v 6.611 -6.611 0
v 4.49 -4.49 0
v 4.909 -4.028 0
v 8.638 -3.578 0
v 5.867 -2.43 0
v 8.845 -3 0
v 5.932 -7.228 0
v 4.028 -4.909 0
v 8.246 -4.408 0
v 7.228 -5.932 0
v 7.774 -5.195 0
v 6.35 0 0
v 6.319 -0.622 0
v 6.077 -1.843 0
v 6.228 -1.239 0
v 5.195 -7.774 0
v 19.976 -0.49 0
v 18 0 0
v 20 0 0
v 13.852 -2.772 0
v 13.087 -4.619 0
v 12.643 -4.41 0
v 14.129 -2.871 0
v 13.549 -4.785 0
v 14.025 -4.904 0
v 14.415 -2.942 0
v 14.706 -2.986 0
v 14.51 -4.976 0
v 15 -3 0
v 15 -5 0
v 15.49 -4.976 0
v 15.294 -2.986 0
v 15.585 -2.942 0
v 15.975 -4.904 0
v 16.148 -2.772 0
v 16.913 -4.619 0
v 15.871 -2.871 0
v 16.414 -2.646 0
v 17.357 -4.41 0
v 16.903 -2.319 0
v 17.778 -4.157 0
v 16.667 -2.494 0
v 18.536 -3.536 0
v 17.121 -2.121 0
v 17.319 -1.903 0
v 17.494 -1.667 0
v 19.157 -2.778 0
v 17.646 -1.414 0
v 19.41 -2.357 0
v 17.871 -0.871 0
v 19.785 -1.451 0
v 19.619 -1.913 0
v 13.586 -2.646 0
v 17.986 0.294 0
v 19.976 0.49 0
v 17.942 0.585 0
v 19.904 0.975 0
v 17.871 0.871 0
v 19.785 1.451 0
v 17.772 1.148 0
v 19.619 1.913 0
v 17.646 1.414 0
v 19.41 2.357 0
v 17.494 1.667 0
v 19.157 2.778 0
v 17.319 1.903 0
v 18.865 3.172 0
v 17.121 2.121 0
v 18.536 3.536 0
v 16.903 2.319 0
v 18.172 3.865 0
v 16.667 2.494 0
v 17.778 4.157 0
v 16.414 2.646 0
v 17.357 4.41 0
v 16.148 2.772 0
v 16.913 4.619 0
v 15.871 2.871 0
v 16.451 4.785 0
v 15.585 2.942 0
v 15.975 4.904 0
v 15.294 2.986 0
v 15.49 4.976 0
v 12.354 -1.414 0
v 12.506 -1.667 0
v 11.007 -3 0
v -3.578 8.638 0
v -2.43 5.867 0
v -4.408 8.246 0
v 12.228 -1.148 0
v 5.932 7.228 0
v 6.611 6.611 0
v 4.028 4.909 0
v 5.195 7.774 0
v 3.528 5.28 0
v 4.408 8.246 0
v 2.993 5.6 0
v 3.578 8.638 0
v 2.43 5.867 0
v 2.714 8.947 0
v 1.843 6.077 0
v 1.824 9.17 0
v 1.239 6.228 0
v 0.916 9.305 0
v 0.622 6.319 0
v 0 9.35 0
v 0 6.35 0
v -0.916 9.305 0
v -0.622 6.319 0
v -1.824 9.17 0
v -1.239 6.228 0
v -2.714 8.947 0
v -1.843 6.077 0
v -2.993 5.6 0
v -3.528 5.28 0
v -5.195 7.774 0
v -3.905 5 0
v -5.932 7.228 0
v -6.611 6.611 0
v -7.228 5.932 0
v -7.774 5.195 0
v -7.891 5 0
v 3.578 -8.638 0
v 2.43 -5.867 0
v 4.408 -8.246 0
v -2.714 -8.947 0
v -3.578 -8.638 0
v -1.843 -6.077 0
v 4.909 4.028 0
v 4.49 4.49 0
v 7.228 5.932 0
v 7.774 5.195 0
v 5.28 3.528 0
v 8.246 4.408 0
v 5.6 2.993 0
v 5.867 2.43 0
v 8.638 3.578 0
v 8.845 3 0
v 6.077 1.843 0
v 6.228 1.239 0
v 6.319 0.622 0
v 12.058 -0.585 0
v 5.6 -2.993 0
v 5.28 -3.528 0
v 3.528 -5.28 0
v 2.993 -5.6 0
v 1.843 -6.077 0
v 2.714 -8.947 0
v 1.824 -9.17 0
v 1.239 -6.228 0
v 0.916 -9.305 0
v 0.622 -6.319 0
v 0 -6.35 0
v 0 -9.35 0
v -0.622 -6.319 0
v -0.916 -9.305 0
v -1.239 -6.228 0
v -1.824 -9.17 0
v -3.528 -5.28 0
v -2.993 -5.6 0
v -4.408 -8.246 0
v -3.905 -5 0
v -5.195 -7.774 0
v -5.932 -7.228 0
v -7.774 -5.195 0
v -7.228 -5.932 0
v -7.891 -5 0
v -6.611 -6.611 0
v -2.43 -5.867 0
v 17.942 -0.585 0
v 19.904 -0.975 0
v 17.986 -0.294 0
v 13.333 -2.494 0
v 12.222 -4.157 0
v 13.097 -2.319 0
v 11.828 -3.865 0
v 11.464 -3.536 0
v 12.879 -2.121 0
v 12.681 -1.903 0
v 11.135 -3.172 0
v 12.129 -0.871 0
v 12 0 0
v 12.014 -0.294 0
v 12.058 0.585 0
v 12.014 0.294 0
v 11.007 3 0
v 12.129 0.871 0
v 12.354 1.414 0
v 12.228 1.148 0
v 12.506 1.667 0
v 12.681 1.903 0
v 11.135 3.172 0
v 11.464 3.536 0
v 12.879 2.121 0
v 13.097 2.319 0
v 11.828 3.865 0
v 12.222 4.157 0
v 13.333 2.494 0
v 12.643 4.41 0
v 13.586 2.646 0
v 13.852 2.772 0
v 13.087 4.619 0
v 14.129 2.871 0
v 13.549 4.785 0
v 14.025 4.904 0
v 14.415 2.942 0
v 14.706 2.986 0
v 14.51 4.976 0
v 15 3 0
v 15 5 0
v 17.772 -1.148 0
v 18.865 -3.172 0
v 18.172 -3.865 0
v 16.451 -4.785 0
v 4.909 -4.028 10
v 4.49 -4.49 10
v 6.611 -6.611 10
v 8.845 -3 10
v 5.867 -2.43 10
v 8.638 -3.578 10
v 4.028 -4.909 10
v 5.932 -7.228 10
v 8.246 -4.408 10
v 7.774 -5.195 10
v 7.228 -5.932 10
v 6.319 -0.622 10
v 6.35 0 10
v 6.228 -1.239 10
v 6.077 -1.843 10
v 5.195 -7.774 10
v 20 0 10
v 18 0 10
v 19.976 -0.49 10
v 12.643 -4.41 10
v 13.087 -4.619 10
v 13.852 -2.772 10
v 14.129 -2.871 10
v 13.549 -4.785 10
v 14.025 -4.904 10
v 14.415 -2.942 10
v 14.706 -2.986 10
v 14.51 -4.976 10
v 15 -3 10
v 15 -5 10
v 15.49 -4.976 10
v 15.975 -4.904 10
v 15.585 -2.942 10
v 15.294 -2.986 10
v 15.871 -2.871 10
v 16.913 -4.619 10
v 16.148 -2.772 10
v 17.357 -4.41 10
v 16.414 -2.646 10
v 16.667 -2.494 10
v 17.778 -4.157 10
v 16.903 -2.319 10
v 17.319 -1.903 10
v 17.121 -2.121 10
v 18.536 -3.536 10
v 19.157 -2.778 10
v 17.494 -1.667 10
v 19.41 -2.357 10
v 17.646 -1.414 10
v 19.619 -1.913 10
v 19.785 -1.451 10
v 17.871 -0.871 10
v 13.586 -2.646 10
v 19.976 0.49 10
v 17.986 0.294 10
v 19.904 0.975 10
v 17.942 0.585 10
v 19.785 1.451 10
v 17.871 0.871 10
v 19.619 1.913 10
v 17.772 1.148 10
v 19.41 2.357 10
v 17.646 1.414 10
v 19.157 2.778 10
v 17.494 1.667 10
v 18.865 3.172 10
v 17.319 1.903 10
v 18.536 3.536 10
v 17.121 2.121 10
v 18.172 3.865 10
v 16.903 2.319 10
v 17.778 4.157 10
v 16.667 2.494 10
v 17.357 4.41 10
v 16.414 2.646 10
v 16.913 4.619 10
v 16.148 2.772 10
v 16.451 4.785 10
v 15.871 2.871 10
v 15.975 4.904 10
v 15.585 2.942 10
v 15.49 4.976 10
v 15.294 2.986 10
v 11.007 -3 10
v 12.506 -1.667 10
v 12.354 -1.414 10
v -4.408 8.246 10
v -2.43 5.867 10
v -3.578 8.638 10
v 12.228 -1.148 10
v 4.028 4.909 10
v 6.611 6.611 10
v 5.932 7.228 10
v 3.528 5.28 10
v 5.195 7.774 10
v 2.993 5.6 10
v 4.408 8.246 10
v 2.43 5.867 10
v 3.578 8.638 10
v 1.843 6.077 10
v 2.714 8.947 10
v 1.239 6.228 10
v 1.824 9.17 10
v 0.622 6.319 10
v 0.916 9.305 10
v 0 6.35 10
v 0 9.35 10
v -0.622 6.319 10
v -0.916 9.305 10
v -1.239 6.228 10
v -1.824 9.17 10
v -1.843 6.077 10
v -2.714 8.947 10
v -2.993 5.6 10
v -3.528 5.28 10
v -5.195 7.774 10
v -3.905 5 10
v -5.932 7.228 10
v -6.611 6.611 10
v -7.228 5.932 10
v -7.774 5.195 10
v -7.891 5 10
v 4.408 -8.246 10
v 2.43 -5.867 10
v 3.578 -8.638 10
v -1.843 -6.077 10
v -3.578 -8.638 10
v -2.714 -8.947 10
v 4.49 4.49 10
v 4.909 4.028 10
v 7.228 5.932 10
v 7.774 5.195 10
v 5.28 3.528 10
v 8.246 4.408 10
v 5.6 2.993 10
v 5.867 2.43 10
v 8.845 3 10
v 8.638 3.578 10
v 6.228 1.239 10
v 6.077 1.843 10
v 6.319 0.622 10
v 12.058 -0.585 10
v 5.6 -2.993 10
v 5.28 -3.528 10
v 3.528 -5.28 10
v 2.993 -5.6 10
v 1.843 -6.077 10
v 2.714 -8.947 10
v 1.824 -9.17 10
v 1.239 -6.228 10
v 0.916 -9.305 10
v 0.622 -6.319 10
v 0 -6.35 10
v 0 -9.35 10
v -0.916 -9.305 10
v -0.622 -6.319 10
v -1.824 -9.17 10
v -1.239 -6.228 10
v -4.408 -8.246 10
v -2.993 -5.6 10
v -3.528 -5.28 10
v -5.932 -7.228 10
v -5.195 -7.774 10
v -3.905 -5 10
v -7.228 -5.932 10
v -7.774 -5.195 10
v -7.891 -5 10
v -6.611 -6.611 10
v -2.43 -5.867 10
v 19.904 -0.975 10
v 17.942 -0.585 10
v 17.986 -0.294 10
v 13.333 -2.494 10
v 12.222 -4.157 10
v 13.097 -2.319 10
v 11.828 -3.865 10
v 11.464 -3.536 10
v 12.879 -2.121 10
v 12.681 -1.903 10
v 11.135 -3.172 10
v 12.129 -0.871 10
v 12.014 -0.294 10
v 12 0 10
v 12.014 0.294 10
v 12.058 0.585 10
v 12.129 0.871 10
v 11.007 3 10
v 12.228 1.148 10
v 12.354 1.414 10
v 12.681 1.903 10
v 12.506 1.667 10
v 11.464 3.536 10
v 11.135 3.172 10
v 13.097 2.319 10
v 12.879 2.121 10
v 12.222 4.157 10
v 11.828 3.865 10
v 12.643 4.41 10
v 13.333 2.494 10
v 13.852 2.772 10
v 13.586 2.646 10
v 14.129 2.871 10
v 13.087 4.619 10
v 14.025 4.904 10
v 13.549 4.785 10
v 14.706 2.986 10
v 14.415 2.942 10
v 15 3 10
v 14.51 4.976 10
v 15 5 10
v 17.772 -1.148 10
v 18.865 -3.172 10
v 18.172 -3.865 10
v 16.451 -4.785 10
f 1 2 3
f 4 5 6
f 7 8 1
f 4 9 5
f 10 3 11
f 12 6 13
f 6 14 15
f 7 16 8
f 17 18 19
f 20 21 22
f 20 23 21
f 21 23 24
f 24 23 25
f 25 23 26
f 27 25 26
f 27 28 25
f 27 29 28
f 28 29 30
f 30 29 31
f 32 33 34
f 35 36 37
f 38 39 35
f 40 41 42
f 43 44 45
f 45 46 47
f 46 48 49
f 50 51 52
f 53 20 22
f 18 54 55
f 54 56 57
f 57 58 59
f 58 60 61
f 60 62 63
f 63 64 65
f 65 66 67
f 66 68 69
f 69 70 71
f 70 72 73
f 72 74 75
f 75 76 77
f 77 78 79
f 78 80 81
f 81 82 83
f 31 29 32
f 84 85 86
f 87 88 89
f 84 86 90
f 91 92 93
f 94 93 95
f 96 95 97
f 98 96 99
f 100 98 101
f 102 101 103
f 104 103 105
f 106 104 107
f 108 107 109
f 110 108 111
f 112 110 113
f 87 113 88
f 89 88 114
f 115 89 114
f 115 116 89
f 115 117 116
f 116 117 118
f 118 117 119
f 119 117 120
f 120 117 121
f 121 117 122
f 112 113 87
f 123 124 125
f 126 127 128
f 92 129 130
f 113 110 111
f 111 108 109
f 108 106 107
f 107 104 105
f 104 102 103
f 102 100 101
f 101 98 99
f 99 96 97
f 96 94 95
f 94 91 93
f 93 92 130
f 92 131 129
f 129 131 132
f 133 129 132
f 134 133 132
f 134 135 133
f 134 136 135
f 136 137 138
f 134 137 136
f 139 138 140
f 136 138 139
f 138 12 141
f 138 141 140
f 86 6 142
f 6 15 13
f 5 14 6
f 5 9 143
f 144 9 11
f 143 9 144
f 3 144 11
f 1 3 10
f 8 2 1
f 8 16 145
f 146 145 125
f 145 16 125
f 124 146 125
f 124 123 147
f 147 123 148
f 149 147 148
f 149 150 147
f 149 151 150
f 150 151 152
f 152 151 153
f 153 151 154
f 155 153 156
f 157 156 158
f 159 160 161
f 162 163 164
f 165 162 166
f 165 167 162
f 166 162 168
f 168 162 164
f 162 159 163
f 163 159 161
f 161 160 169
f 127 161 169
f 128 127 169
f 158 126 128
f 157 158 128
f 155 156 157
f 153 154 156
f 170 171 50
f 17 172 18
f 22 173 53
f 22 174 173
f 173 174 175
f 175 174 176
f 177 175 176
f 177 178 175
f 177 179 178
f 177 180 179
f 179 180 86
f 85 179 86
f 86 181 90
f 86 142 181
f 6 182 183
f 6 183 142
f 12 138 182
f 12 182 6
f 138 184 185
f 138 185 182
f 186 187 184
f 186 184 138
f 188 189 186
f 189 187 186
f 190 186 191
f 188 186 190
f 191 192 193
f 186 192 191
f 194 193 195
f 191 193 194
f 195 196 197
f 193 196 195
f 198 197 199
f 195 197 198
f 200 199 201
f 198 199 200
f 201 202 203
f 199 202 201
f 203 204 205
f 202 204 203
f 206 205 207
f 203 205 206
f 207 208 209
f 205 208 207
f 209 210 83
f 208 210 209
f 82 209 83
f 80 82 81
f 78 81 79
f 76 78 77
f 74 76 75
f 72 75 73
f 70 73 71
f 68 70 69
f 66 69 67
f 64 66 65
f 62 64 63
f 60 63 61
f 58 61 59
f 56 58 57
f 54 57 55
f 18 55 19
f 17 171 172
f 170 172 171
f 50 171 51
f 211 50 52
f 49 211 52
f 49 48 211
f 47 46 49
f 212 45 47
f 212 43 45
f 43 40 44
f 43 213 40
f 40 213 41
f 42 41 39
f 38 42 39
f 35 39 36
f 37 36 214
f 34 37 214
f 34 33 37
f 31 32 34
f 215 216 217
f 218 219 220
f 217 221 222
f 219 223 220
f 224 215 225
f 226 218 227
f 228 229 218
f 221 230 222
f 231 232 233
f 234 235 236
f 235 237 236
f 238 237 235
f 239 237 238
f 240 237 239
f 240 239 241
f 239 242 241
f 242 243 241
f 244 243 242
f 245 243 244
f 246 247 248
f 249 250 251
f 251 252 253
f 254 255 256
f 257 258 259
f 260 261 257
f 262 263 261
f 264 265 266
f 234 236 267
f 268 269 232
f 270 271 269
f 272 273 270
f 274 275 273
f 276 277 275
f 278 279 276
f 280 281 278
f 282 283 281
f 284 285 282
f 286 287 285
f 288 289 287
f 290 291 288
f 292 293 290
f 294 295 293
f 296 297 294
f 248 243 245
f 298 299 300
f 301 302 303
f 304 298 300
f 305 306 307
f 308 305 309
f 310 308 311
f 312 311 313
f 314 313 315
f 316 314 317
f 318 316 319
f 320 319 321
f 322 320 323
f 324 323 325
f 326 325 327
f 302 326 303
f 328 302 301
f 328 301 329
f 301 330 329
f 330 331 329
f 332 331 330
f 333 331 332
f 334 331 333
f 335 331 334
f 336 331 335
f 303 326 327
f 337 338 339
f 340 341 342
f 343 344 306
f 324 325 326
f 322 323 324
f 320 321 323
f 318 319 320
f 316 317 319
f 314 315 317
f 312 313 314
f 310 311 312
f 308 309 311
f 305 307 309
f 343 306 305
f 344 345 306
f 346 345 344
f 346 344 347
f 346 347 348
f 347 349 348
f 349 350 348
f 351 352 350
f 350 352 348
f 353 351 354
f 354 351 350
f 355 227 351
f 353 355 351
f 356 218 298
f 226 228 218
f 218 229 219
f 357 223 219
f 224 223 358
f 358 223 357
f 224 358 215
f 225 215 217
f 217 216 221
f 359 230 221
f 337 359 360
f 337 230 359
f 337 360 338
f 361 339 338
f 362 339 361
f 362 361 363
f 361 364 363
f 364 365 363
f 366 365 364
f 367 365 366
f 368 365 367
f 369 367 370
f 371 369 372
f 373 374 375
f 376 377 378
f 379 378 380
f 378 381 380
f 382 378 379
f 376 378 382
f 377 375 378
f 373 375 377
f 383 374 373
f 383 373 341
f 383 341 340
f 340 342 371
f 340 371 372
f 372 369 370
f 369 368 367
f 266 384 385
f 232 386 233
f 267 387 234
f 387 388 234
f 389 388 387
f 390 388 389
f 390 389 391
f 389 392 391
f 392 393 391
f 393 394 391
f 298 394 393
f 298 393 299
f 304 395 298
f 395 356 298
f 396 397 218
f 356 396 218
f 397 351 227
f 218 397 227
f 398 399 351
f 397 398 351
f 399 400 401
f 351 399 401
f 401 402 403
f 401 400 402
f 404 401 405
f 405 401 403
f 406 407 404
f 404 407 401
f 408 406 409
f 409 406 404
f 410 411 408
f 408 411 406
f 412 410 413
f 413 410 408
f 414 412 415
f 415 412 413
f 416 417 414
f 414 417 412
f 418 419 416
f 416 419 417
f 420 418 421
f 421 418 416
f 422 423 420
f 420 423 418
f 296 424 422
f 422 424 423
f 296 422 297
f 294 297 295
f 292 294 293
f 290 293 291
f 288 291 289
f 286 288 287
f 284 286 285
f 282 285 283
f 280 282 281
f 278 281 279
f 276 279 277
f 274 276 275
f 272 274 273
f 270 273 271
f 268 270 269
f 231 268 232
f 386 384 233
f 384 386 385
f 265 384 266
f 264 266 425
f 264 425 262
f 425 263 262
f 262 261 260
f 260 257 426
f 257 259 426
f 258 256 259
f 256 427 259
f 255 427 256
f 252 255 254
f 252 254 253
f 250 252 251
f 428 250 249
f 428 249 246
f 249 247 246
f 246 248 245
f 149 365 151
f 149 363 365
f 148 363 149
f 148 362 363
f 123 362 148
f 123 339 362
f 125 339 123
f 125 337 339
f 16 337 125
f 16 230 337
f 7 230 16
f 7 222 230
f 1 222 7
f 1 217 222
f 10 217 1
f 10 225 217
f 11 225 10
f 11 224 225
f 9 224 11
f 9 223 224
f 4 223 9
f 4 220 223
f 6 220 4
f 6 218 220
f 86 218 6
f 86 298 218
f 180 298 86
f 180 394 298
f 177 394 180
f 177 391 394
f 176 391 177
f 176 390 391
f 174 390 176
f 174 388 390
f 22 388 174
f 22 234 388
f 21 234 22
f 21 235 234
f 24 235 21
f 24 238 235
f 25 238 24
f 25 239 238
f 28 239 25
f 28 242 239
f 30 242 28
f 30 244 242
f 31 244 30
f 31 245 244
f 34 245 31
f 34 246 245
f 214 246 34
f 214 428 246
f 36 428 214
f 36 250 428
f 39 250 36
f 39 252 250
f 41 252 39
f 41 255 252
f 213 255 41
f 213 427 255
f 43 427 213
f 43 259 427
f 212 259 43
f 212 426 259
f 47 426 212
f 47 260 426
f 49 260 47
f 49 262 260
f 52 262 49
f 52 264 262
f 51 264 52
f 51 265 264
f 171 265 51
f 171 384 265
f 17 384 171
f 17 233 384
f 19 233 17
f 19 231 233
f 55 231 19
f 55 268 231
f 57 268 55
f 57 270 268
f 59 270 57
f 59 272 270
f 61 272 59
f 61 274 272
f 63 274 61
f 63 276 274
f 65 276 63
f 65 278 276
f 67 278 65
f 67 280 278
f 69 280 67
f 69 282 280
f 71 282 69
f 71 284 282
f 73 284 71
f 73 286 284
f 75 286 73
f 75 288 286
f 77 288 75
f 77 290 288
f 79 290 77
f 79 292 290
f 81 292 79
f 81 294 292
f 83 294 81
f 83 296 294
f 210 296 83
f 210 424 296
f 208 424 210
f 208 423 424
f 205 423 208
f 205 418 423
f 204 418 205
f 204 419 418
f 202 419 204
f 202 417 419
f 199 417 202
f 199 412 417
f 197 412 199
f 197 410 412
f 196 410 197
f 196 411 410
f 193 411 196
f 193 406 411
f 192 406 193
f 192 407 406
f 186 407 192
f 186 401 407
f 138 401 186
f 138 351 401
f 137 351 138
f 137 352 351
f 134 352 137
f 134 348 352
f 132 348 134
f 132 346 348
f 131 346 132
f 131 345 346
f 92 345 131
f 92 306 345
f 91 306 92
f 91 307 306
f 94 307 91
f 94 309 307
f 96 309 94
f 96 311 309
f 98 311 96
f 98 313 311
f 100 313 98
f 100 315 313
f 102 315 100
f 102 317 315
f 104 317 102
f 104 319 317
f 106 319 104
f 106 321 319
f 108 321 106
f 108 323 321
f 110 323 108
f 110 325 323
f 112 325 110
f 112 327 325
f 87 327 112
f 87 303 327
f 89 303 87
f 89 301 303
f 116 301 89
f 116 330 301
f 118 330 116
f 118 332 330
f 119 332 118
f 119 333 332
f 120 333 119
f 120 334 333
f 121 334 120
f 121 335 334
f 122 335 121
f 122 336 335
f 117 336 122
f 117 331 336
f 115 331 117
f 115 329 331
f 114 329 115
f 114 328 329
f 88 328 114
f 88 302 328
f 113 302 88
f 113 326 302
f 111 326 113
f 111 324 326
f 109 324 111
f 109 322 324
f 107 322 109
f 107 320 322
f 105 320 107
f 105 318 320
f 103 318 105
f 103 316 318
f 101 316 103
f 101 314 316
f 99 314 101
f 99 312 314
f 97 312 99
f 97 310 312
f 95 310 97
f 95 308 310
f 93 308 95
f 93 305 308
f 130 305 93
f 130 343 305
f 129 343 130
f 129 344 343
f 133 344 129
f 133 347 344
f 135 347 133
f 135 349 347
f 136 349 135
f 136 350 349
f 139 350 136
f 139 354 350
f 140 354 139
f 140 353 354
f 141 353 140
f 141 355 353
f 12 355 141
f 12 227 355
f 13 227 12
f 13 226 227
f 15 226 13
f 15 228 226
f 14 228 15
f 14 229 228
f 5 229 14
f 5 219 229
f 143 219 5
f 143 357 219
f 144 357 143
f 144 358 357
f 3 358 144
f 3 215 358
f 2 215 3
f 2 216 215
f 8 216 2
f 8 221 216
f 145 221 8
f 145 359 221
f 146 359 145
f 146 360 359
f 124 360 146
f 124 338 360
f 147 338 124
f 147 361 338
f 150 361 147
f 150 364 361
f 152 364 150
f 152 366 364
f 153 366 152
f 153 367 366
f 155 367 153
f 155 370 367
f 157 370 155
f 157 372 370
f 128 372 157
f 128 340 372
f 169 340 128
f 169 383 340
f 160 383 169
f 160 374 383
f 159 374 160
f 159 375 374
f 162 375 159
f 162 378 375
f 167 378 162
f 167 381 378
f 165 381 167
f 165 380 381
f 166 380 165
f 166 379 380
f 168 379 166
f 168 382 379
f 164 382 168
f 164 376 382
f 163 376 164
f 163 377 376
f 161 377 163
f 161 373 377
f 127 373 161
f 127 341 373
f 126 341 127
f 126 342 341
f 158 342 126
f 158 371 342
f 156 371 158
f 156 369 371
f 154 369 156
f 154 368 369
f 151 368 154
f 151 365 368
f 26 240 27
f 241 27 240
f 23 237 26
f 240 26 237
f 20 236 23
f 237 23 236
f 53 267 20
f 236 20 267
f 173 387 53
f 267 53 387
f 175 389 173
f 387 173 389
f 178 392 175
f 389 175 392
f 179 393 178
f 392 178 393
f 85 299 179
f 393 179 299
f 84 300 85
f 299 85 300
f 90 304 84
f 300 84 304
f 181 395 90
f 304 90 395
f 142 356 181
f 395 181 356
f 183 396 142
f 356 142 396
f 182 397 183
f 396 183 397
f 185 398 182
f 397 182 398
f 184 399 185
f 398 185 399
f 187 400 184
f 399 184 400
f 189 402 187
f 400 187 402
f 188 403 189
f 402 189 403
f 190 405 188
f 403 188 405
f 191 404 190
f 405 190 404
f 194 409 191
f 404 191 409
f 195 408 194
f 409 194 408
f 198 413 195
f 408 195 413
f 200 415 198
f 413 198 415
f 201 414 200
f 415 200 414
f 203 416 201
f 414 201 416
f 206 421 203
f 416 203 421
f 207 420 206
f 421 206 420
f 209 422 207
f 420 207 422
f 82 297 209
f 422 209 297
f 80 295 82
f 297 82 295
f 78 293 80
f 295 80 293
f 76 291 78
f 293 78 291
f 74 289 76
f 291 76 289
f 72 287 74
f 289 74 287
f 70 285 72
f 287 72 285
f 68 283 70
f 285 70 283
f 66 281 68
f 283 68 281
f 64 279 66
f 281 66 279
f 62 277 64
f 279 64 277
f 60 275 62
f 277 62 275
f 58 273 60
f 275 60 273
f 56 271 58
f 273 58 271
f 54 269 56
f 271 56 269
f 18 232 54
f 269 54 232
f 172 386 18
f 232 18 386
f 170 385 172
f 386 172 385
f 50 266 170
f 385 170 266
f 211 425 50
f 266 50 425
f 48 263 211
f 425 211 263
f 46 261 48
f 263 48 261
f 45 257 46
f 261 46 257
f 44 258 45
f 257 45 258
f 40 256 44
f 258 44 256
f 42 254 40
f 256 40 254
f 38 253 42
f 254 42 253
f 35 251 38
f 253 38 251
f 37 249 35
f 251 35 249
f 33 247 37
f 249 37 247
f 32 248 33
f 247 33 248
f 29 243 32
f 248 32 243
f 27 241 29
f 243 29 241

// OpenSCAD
$fn = 64;

// Rod ring dimensions
ROD_ID = 12.7;              // Inner diameter of rod ring
ROD_WALL = 3;               // Wall thickness of rod ring
ROD_OR = ROD_ID/2 + ROD_WALL; // Outer radius of rod ring
ROD_CUT_Y_HALF = 5;         // Half-width of rod opening

// Tubing ring dimensions
TUBE_ID = 6;                // Inner diameter of tubing ring
TUBE_WALL = 2;              // Wall thickness of tubing ring
TUBE_OR = TUBE_ID/2 + TUBE_WALL; // Outer radius of tubing ring
TUBE_CX = 15;               // X center of tubing ring
TUBE_CY = 0;                // Y center of tubing ring
TUBE_CUT_X = 15;            // X start of tubing opening
TUBE_CUT_Y_HALF = 2.25;     // Half-width of tubing opening

// Bridge dimensions
BRIDGE_X_MIN = 8;           // X start of bridge
BRIDGE_X_MAX = 12;          // X end of bridge
BRIDGE_Y_HALF = 3;          // Half-width of bridge

// Extrusion height
HEIGHT = 10;                // Height of the clip

// Build the 2D profile directly inside linear_extrude
linear_extrude(height = HEIGHT) {
    union() {
        // Rod ring with opening
        difference() {
            circle(r = ROD_OR);
            circle(r = ROD_ID/2);
            // Cut out the opening on the -X side, extending past the outer face
            translate([-ROD_OR - 0.5, -ROD_CUT_Y_HALF]) square([ROD_OR + 0.5, 2*ROD_CUT_Y_HALF]);
        }
        
        // Tubing ring with opening
        translate([TUBE_CX, TUBE_CY]) {
            difference() {
                circle(r = TUBE_OR);
                circle(r = TUBE_ID/2);
                // Cut out the opening on the +X side, extending past the outer face
                translate([TUBE_CUT_X, -TUBE_CUT_Y_HALF]) square([TUBE_OR + 0.5, 2*TUBE_CUT_Y_HALF]);
            }
        }
        
        // Solid bridge connecting the rings
        translate([BRIDGE_X_MIN, -BRIDGE_Y_HALF]) square([BRIDGE_X_MAX - BRIDGE_X_MIN, 2*BRIDGE_Y_HALF]);
    }
}
